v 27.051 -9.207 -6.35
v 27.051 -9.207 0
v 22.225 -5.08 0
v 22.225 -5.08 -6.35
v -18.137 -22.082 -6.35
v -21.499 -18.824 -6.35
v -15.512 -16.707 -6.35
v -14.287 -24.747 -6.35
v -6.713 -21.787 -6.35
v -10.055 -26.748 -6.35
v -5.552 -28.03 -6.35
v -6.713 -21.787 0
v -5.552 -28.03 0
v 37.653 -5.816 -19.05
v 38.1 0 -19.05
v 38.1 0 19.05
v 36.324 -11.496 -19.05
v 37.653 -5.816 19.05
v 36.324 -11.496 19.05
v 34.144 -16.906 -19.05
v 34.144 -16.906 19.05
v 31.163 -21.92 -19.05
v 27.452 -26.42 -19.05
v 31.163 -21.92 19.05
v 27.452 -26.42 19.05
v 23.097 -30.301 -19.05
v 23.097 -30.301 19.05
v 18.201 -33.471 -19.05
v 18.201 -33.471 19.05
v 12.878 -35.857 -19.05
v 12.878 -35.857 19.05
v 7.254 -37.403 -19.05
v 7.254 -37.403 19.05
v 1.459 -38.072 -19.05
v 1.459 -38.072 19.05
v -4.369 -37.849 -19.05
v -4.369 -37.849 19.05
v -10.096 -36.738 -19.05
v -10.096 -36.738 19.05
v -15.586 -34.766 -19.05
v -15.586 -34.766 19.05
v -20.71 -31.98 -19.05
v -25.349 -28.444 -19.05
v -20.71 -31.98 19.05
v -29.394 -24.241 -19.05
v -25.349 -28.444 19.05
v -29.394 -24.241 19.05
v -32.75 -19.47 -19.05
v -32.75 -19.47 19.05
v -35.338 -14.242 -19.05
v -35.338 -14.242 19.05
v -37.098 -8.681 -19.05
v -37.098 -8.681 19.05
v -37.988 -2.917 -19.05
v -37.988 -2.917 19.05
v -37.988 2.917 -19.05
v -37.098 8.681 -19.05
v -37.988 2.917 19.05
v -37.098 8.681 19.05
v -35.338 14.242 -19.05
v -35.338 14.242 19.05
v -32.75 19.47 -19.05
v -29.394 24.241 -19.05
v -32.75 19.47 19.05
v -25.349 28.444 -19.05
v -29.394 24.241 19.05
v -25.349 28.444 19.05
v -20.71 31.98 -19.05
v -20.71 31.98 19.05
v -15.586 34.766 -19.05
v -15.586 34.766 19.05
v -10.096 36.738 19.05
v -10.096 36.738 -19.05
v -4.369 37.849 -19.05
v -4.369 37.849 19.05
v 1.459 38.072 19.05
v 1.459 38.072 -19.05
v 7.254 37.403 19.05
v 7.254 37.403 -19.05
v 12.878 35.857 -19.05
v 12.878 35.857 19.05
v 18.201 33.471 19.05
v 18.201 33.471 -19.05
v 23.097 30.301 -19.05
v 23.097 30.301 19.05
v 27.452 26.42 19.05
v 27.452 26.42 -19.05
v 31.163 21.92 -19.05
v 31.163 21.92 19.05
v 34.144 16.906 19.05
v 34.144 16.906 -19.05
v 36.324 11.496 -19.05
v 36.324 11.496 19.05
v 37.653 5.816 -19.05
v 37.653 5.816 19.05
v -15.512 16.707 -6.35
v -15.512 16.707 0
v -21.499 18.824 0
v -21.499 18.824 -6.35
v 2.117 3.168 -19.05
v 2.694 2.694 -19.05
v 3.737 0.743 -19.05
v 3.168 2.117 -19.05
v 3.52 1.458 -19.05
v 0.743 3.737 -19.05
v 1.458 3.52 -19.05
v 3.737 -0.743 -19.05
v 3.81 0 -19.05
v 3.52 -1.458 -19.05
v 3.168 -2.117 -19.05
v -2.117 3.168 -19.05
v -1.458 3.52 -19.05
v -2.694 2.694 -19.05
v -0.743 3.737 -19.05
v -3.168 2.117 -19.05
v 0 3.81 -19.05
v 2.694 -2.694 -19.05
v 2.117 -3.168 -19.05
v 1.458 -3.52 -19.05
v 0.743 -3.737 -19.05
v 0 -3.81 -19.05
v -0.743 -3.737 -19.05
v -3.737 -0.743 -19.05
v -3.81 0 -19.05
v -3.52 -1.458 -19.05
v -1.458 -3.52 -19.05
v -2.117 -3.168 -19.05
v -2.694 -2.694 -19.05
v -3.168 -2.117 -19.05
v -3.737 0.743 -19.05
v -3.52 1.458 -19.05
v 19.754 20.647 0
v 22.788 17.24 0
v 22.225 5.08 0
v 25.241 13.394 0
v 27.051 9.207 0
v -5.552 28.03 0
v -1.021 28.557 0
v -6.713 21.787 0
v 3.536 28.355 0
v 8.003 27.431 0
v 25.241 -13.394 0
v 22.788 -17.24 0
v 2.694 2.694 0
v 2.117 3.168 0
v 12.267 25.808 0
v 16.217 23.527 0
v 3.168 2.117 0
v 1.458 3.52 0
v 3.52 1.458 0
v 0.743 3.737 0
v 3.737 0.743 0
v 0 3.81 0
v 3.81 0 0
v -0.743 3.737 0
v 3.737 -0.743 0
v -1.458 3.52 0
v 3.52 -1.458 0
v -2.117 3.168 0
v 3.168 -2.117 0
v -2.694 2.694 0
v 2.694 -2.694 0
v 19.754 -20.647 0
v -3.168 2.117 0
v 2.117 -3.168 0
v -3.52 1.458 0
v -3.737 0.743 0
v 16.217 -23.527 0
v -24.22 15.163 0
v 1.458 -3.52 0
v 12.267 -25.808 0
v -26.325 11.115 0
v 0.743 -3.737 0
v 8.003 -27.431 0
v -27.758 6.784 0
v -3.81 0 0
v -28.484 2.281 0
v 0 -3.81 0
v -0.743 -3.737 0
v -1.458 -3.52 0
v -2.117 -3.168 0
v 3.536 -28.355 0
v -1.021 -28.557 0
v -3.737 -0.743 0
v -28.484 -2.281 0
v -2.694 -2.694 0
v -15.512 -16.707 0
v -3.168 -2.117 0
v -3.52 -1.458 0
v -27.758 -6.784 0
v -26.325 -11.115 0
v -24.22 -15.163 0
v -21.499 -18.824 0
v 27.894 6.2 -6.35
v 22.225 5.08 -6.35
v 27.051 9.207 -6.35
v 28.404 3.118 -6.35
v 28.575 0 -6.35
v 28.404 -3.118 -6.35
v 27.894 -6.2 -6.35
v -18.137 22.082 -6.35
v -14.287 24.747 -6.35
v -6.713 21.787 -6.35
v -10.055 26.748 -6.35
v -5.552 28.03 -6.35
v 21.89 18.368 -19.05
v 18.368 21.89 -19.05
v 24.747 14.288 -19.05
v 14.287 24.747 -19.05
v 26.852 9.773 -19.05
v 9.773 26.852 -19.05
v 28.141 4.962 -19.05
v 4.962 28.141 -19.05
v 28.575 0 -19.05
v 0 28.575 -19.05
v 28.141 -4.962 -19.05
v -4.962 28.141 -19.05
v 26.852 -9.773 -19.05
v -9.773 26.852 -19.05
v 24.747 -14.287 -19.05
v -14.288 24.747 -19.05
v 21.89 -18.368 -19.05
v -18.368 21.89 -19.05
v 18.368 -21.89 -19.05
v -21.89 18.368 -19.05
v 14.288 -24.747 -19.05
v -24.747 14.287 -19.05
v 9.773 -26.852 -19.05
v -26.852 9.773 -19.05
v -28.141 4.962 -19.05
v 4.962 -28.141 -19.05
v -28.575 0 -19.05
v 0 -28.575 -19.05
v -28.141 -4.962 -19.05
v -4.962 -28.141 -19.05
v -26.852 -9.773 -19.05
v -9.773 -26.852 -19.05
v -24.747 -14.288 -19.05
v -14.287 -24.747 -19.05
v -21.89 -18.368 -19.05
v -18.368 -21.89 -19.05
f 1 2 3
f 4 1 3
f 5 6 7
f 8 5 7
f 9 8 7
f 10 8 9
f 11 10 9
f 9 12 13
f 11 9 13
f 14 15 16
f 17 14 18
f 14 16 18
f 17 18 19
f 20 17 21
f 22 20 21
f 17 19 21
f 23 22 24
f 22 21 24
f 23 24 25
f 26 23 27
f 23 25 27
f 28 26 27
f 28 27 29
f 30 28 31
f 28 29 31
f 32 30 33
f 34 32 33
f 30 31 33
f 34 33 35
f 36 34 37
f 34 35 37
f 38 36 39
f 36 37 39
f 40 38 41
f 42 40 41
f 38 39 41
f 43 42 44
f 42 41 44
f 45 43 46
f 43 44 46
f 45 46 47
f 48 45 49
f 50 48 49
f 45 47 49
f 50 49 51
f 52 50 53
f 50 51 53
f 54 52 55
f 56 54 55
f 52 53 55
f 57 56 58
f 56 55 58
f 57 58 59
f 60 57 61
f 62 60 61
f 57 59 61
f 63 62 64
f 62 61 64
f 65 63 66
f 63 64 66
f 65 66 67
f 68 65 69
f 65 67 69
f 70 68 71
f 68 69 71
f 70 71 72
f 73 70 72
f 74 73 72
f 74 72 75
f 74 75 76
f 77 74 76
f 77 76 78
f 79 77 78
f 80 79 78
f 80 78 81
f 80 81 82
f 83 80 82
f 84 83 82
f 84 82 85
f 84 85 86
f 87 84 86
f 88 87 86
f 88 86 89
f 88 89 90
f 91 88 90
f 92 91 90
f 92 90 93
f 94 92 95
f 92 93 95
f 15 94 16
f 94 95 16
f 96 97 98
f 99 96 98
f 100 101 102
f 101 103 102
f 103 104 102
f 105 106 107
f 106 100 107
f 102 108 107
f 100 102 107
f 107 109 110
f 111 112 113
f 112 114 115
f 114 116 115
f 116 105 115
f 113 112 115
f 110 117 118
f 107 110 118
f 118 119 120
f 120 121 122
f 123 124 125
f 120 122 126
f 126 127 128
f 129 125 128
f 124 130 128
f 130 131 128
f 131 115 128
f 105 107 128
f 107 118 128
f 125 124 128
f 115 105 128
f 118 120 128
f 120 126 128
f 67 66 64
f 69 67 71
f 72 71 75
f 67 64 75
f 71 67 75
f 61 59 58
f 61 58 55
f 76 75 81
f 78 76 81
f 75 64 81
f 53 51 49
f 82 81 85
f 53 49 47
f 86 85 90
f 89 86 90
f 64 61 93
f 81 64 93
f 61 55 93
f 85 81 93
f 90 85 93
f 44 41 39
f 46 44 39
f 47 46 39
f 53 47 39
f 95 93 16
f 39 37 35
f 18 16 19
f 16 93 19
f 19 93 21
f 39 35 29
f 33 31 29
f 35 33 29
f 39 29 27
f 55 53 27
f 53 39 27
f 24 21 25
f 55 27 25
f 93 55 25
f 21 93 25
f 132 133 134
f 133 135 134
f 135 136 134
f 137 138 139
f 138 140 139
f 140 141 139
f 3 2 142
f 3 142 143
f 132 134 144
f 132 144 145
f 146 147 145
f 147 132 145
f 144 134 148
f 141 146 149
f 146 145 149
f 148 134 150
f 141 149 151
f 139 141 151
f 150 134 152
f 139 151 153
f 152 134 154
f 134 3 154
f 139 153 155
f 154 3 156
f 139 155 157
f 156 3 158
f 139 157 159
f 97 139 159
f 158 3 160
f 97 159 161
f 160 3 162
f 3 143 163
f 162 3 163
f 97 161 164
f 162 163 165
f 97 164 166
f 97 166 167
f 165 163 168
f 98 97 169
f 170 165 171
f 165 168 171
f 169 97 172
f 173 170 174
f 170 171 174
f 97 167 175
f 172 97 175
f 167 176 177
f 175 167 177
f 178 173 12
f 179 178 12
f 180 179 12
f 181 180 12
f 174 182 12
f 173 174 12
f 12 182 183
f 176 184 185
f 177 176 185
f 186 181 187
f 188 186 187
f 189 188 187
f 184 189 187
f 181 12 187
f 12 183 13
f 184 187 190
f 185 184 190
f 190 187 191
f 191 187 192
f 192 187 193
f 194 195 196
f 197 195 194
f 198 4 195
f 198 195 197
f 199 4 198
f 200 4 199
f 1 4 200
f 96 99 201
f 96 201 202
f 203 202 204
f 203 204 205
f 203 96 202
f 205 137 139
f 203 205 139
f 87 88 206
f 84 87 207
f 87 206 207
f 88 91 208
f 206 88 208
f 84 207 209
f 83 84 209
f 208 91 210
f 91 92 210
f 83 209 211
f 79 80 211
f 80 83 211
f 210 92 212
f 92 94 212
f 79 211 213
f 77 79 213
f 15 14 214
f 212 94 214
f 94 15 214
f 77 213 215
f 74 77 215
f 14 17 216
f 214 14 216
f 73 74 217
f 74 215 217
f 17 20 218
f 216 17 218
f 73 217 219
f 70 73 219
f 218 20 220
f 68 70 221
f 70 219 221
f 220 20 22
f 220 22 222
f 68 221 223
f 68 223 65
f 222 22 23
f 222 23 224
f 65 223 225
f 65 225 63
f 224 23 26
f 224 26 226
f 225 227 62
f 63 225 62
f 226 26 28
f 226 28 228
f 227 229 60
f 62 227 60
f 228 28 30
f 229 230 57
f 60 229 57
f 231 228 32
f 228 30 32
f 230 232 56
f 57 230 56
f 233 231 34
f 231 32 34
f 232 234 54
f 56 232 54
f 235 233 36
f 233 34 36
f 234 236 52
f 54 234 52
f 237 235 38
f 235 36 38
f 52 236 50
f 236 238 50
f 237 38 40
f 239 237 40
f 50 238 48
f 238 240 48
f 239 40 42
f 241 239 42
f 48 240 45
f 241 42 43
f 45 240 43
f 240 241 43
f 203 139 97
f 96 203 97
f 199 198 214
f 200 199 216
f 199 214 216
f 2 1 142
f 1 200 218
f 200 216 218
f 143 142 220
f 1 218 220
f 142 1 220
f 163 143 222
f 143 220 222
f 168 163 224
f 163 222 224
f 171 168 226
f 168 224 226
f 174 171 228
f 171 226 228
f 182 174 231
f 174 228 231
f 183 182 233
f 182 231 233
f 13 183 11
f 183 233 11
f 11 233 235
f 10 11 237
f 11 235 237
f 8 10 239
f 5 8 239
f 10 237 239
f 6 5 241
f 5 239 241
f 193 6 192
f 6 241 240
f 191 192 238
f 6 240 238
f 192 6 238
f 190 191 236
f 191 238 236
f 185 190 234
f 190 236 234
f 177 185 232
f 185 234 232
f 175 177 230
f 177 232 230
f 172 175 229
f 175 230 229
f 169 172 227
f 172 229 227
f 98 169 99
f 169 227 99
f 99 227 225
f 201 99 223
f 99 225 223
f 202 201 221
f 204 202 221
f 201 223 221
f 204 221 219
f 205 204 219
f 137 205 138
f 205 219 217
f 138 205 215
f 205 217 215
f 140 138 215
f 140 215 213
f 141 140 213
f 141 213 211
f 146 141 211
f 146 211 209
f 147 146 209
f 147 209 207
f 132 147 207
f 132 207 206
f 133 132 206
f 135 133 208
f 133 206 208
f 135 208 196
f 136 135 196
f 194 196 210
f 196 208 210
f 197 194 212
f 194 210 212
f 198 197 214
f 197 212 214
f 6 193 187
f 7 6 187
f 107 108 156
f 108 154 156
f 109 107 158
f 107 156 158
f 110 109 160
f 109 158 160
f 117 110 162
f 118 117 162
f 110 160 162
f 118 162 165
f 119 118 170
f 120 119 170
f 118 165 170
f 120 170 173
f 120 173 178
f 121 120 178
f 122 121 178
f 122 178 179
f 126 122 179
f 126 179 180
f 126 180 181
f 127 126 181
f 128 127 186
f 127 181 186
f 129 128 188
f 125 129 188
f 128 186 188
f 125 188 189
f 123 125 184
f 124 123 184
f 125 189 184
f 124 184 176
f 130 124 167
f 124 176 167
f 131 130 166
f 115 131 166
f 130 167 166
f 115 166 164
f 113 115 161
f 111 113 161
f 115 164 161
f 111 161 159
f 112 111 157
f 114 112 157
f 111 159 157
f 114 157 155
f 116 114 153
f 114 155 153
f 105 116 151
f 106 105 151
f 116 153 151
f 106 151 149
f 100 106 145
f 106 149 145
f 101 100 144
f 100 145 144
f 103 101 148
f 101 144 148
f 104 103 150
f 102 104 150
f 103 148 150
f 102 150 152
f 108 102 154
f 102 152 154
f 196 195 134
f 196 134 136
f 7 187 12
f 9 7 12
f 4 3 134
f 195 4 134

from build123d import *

# Parameters (mm, degrees)
F0_W     = 3.81
F0_H     = 19.05
F3_DEPTH = 6.35


with BuildPart() as f1:
    # F0 (on Front) → F1 (revolve)
    with BuildSketch(Plane.XZ):
        Polygon((0, 19.05), (0, 0), (3.81, 0), (28.575, 0), (28.575, -19.05), (38.1, -19.05), (38.1, 19.05), align=None)
        with Locations((1.905, -9.525)):
            Rectangle(F0_W, F0_H)
    revolve(axis=Axis((0, 0, 9.525), (0, 0, -1)))

    # F2 (on face) → F3 (join)
    with BuildSketch(Plane(origin=(0, 0, 0), x_dir=(1, 0, 0), z_dir=(0, 0, -1))):
        with BuildLine():
            Line((-6.7130909488, 21.7874145991), (-5.5522246622, 28.030401822))
            ThreePointArc((-5.5522246622, 28.030401822), (-14.2875, 24.7466759131), (-21.498927725, 18.823568516))
            Line((-21.498927725, 18.823568516), (-15.5119090512, 16.7074145991))
            Line((-15.5119090512, 16.7074145991), (-11.1125, 19.2474145991))
            Line((-11.1125, 19.2474145991), (-6.7130909488, 21.7874145991))
        make_face()
        with BuildLine():
            Line((22.225, 0), (28.575, 0))
            ThreePointArc((28.575, 0), (28.1914641733, 4.6660446599), (27.0511523872, 9.206833306))
            Line((27.0511523872, 9.206833306), (22.225, 5.08))
            Line((22.225, 5.08), (22.225, 0))
        make_face()
        with BuildLine():
            ThreePointArc((27.0511523872, -9.206833306), (28.1914641733, -4.6660446599), (28.575, 0))
            Line((28.575, 0), (22.225, 0))
            Line((22.225, 0), (22.225, -5.08))
            Line((22.225, -5.08), (27.0511523872, -9.206833306))
        make_face()
        with BuildLine():
            ThreePointArc((-21.498927725, -18.823568516), (-14.2875, -24.7466759131), (-5.5522246622, -28.030401822))
            Line((-5.5522246622, -28.030401822), (-6.7130909488, -21.7874145991))
            Line((-6.7130909488, -21.7874145991), (-11.1125, -19.2474145991))
            Line((-11.1125, -19.2474145991), (-15.5119090512, -16.7074145991))
            Line((-15.5119090512, -16.7074145991), (-21.498927725, -18.823568516))
        make_face()
    extrude(amount=F3_DEPTH)


solid = f1.part
